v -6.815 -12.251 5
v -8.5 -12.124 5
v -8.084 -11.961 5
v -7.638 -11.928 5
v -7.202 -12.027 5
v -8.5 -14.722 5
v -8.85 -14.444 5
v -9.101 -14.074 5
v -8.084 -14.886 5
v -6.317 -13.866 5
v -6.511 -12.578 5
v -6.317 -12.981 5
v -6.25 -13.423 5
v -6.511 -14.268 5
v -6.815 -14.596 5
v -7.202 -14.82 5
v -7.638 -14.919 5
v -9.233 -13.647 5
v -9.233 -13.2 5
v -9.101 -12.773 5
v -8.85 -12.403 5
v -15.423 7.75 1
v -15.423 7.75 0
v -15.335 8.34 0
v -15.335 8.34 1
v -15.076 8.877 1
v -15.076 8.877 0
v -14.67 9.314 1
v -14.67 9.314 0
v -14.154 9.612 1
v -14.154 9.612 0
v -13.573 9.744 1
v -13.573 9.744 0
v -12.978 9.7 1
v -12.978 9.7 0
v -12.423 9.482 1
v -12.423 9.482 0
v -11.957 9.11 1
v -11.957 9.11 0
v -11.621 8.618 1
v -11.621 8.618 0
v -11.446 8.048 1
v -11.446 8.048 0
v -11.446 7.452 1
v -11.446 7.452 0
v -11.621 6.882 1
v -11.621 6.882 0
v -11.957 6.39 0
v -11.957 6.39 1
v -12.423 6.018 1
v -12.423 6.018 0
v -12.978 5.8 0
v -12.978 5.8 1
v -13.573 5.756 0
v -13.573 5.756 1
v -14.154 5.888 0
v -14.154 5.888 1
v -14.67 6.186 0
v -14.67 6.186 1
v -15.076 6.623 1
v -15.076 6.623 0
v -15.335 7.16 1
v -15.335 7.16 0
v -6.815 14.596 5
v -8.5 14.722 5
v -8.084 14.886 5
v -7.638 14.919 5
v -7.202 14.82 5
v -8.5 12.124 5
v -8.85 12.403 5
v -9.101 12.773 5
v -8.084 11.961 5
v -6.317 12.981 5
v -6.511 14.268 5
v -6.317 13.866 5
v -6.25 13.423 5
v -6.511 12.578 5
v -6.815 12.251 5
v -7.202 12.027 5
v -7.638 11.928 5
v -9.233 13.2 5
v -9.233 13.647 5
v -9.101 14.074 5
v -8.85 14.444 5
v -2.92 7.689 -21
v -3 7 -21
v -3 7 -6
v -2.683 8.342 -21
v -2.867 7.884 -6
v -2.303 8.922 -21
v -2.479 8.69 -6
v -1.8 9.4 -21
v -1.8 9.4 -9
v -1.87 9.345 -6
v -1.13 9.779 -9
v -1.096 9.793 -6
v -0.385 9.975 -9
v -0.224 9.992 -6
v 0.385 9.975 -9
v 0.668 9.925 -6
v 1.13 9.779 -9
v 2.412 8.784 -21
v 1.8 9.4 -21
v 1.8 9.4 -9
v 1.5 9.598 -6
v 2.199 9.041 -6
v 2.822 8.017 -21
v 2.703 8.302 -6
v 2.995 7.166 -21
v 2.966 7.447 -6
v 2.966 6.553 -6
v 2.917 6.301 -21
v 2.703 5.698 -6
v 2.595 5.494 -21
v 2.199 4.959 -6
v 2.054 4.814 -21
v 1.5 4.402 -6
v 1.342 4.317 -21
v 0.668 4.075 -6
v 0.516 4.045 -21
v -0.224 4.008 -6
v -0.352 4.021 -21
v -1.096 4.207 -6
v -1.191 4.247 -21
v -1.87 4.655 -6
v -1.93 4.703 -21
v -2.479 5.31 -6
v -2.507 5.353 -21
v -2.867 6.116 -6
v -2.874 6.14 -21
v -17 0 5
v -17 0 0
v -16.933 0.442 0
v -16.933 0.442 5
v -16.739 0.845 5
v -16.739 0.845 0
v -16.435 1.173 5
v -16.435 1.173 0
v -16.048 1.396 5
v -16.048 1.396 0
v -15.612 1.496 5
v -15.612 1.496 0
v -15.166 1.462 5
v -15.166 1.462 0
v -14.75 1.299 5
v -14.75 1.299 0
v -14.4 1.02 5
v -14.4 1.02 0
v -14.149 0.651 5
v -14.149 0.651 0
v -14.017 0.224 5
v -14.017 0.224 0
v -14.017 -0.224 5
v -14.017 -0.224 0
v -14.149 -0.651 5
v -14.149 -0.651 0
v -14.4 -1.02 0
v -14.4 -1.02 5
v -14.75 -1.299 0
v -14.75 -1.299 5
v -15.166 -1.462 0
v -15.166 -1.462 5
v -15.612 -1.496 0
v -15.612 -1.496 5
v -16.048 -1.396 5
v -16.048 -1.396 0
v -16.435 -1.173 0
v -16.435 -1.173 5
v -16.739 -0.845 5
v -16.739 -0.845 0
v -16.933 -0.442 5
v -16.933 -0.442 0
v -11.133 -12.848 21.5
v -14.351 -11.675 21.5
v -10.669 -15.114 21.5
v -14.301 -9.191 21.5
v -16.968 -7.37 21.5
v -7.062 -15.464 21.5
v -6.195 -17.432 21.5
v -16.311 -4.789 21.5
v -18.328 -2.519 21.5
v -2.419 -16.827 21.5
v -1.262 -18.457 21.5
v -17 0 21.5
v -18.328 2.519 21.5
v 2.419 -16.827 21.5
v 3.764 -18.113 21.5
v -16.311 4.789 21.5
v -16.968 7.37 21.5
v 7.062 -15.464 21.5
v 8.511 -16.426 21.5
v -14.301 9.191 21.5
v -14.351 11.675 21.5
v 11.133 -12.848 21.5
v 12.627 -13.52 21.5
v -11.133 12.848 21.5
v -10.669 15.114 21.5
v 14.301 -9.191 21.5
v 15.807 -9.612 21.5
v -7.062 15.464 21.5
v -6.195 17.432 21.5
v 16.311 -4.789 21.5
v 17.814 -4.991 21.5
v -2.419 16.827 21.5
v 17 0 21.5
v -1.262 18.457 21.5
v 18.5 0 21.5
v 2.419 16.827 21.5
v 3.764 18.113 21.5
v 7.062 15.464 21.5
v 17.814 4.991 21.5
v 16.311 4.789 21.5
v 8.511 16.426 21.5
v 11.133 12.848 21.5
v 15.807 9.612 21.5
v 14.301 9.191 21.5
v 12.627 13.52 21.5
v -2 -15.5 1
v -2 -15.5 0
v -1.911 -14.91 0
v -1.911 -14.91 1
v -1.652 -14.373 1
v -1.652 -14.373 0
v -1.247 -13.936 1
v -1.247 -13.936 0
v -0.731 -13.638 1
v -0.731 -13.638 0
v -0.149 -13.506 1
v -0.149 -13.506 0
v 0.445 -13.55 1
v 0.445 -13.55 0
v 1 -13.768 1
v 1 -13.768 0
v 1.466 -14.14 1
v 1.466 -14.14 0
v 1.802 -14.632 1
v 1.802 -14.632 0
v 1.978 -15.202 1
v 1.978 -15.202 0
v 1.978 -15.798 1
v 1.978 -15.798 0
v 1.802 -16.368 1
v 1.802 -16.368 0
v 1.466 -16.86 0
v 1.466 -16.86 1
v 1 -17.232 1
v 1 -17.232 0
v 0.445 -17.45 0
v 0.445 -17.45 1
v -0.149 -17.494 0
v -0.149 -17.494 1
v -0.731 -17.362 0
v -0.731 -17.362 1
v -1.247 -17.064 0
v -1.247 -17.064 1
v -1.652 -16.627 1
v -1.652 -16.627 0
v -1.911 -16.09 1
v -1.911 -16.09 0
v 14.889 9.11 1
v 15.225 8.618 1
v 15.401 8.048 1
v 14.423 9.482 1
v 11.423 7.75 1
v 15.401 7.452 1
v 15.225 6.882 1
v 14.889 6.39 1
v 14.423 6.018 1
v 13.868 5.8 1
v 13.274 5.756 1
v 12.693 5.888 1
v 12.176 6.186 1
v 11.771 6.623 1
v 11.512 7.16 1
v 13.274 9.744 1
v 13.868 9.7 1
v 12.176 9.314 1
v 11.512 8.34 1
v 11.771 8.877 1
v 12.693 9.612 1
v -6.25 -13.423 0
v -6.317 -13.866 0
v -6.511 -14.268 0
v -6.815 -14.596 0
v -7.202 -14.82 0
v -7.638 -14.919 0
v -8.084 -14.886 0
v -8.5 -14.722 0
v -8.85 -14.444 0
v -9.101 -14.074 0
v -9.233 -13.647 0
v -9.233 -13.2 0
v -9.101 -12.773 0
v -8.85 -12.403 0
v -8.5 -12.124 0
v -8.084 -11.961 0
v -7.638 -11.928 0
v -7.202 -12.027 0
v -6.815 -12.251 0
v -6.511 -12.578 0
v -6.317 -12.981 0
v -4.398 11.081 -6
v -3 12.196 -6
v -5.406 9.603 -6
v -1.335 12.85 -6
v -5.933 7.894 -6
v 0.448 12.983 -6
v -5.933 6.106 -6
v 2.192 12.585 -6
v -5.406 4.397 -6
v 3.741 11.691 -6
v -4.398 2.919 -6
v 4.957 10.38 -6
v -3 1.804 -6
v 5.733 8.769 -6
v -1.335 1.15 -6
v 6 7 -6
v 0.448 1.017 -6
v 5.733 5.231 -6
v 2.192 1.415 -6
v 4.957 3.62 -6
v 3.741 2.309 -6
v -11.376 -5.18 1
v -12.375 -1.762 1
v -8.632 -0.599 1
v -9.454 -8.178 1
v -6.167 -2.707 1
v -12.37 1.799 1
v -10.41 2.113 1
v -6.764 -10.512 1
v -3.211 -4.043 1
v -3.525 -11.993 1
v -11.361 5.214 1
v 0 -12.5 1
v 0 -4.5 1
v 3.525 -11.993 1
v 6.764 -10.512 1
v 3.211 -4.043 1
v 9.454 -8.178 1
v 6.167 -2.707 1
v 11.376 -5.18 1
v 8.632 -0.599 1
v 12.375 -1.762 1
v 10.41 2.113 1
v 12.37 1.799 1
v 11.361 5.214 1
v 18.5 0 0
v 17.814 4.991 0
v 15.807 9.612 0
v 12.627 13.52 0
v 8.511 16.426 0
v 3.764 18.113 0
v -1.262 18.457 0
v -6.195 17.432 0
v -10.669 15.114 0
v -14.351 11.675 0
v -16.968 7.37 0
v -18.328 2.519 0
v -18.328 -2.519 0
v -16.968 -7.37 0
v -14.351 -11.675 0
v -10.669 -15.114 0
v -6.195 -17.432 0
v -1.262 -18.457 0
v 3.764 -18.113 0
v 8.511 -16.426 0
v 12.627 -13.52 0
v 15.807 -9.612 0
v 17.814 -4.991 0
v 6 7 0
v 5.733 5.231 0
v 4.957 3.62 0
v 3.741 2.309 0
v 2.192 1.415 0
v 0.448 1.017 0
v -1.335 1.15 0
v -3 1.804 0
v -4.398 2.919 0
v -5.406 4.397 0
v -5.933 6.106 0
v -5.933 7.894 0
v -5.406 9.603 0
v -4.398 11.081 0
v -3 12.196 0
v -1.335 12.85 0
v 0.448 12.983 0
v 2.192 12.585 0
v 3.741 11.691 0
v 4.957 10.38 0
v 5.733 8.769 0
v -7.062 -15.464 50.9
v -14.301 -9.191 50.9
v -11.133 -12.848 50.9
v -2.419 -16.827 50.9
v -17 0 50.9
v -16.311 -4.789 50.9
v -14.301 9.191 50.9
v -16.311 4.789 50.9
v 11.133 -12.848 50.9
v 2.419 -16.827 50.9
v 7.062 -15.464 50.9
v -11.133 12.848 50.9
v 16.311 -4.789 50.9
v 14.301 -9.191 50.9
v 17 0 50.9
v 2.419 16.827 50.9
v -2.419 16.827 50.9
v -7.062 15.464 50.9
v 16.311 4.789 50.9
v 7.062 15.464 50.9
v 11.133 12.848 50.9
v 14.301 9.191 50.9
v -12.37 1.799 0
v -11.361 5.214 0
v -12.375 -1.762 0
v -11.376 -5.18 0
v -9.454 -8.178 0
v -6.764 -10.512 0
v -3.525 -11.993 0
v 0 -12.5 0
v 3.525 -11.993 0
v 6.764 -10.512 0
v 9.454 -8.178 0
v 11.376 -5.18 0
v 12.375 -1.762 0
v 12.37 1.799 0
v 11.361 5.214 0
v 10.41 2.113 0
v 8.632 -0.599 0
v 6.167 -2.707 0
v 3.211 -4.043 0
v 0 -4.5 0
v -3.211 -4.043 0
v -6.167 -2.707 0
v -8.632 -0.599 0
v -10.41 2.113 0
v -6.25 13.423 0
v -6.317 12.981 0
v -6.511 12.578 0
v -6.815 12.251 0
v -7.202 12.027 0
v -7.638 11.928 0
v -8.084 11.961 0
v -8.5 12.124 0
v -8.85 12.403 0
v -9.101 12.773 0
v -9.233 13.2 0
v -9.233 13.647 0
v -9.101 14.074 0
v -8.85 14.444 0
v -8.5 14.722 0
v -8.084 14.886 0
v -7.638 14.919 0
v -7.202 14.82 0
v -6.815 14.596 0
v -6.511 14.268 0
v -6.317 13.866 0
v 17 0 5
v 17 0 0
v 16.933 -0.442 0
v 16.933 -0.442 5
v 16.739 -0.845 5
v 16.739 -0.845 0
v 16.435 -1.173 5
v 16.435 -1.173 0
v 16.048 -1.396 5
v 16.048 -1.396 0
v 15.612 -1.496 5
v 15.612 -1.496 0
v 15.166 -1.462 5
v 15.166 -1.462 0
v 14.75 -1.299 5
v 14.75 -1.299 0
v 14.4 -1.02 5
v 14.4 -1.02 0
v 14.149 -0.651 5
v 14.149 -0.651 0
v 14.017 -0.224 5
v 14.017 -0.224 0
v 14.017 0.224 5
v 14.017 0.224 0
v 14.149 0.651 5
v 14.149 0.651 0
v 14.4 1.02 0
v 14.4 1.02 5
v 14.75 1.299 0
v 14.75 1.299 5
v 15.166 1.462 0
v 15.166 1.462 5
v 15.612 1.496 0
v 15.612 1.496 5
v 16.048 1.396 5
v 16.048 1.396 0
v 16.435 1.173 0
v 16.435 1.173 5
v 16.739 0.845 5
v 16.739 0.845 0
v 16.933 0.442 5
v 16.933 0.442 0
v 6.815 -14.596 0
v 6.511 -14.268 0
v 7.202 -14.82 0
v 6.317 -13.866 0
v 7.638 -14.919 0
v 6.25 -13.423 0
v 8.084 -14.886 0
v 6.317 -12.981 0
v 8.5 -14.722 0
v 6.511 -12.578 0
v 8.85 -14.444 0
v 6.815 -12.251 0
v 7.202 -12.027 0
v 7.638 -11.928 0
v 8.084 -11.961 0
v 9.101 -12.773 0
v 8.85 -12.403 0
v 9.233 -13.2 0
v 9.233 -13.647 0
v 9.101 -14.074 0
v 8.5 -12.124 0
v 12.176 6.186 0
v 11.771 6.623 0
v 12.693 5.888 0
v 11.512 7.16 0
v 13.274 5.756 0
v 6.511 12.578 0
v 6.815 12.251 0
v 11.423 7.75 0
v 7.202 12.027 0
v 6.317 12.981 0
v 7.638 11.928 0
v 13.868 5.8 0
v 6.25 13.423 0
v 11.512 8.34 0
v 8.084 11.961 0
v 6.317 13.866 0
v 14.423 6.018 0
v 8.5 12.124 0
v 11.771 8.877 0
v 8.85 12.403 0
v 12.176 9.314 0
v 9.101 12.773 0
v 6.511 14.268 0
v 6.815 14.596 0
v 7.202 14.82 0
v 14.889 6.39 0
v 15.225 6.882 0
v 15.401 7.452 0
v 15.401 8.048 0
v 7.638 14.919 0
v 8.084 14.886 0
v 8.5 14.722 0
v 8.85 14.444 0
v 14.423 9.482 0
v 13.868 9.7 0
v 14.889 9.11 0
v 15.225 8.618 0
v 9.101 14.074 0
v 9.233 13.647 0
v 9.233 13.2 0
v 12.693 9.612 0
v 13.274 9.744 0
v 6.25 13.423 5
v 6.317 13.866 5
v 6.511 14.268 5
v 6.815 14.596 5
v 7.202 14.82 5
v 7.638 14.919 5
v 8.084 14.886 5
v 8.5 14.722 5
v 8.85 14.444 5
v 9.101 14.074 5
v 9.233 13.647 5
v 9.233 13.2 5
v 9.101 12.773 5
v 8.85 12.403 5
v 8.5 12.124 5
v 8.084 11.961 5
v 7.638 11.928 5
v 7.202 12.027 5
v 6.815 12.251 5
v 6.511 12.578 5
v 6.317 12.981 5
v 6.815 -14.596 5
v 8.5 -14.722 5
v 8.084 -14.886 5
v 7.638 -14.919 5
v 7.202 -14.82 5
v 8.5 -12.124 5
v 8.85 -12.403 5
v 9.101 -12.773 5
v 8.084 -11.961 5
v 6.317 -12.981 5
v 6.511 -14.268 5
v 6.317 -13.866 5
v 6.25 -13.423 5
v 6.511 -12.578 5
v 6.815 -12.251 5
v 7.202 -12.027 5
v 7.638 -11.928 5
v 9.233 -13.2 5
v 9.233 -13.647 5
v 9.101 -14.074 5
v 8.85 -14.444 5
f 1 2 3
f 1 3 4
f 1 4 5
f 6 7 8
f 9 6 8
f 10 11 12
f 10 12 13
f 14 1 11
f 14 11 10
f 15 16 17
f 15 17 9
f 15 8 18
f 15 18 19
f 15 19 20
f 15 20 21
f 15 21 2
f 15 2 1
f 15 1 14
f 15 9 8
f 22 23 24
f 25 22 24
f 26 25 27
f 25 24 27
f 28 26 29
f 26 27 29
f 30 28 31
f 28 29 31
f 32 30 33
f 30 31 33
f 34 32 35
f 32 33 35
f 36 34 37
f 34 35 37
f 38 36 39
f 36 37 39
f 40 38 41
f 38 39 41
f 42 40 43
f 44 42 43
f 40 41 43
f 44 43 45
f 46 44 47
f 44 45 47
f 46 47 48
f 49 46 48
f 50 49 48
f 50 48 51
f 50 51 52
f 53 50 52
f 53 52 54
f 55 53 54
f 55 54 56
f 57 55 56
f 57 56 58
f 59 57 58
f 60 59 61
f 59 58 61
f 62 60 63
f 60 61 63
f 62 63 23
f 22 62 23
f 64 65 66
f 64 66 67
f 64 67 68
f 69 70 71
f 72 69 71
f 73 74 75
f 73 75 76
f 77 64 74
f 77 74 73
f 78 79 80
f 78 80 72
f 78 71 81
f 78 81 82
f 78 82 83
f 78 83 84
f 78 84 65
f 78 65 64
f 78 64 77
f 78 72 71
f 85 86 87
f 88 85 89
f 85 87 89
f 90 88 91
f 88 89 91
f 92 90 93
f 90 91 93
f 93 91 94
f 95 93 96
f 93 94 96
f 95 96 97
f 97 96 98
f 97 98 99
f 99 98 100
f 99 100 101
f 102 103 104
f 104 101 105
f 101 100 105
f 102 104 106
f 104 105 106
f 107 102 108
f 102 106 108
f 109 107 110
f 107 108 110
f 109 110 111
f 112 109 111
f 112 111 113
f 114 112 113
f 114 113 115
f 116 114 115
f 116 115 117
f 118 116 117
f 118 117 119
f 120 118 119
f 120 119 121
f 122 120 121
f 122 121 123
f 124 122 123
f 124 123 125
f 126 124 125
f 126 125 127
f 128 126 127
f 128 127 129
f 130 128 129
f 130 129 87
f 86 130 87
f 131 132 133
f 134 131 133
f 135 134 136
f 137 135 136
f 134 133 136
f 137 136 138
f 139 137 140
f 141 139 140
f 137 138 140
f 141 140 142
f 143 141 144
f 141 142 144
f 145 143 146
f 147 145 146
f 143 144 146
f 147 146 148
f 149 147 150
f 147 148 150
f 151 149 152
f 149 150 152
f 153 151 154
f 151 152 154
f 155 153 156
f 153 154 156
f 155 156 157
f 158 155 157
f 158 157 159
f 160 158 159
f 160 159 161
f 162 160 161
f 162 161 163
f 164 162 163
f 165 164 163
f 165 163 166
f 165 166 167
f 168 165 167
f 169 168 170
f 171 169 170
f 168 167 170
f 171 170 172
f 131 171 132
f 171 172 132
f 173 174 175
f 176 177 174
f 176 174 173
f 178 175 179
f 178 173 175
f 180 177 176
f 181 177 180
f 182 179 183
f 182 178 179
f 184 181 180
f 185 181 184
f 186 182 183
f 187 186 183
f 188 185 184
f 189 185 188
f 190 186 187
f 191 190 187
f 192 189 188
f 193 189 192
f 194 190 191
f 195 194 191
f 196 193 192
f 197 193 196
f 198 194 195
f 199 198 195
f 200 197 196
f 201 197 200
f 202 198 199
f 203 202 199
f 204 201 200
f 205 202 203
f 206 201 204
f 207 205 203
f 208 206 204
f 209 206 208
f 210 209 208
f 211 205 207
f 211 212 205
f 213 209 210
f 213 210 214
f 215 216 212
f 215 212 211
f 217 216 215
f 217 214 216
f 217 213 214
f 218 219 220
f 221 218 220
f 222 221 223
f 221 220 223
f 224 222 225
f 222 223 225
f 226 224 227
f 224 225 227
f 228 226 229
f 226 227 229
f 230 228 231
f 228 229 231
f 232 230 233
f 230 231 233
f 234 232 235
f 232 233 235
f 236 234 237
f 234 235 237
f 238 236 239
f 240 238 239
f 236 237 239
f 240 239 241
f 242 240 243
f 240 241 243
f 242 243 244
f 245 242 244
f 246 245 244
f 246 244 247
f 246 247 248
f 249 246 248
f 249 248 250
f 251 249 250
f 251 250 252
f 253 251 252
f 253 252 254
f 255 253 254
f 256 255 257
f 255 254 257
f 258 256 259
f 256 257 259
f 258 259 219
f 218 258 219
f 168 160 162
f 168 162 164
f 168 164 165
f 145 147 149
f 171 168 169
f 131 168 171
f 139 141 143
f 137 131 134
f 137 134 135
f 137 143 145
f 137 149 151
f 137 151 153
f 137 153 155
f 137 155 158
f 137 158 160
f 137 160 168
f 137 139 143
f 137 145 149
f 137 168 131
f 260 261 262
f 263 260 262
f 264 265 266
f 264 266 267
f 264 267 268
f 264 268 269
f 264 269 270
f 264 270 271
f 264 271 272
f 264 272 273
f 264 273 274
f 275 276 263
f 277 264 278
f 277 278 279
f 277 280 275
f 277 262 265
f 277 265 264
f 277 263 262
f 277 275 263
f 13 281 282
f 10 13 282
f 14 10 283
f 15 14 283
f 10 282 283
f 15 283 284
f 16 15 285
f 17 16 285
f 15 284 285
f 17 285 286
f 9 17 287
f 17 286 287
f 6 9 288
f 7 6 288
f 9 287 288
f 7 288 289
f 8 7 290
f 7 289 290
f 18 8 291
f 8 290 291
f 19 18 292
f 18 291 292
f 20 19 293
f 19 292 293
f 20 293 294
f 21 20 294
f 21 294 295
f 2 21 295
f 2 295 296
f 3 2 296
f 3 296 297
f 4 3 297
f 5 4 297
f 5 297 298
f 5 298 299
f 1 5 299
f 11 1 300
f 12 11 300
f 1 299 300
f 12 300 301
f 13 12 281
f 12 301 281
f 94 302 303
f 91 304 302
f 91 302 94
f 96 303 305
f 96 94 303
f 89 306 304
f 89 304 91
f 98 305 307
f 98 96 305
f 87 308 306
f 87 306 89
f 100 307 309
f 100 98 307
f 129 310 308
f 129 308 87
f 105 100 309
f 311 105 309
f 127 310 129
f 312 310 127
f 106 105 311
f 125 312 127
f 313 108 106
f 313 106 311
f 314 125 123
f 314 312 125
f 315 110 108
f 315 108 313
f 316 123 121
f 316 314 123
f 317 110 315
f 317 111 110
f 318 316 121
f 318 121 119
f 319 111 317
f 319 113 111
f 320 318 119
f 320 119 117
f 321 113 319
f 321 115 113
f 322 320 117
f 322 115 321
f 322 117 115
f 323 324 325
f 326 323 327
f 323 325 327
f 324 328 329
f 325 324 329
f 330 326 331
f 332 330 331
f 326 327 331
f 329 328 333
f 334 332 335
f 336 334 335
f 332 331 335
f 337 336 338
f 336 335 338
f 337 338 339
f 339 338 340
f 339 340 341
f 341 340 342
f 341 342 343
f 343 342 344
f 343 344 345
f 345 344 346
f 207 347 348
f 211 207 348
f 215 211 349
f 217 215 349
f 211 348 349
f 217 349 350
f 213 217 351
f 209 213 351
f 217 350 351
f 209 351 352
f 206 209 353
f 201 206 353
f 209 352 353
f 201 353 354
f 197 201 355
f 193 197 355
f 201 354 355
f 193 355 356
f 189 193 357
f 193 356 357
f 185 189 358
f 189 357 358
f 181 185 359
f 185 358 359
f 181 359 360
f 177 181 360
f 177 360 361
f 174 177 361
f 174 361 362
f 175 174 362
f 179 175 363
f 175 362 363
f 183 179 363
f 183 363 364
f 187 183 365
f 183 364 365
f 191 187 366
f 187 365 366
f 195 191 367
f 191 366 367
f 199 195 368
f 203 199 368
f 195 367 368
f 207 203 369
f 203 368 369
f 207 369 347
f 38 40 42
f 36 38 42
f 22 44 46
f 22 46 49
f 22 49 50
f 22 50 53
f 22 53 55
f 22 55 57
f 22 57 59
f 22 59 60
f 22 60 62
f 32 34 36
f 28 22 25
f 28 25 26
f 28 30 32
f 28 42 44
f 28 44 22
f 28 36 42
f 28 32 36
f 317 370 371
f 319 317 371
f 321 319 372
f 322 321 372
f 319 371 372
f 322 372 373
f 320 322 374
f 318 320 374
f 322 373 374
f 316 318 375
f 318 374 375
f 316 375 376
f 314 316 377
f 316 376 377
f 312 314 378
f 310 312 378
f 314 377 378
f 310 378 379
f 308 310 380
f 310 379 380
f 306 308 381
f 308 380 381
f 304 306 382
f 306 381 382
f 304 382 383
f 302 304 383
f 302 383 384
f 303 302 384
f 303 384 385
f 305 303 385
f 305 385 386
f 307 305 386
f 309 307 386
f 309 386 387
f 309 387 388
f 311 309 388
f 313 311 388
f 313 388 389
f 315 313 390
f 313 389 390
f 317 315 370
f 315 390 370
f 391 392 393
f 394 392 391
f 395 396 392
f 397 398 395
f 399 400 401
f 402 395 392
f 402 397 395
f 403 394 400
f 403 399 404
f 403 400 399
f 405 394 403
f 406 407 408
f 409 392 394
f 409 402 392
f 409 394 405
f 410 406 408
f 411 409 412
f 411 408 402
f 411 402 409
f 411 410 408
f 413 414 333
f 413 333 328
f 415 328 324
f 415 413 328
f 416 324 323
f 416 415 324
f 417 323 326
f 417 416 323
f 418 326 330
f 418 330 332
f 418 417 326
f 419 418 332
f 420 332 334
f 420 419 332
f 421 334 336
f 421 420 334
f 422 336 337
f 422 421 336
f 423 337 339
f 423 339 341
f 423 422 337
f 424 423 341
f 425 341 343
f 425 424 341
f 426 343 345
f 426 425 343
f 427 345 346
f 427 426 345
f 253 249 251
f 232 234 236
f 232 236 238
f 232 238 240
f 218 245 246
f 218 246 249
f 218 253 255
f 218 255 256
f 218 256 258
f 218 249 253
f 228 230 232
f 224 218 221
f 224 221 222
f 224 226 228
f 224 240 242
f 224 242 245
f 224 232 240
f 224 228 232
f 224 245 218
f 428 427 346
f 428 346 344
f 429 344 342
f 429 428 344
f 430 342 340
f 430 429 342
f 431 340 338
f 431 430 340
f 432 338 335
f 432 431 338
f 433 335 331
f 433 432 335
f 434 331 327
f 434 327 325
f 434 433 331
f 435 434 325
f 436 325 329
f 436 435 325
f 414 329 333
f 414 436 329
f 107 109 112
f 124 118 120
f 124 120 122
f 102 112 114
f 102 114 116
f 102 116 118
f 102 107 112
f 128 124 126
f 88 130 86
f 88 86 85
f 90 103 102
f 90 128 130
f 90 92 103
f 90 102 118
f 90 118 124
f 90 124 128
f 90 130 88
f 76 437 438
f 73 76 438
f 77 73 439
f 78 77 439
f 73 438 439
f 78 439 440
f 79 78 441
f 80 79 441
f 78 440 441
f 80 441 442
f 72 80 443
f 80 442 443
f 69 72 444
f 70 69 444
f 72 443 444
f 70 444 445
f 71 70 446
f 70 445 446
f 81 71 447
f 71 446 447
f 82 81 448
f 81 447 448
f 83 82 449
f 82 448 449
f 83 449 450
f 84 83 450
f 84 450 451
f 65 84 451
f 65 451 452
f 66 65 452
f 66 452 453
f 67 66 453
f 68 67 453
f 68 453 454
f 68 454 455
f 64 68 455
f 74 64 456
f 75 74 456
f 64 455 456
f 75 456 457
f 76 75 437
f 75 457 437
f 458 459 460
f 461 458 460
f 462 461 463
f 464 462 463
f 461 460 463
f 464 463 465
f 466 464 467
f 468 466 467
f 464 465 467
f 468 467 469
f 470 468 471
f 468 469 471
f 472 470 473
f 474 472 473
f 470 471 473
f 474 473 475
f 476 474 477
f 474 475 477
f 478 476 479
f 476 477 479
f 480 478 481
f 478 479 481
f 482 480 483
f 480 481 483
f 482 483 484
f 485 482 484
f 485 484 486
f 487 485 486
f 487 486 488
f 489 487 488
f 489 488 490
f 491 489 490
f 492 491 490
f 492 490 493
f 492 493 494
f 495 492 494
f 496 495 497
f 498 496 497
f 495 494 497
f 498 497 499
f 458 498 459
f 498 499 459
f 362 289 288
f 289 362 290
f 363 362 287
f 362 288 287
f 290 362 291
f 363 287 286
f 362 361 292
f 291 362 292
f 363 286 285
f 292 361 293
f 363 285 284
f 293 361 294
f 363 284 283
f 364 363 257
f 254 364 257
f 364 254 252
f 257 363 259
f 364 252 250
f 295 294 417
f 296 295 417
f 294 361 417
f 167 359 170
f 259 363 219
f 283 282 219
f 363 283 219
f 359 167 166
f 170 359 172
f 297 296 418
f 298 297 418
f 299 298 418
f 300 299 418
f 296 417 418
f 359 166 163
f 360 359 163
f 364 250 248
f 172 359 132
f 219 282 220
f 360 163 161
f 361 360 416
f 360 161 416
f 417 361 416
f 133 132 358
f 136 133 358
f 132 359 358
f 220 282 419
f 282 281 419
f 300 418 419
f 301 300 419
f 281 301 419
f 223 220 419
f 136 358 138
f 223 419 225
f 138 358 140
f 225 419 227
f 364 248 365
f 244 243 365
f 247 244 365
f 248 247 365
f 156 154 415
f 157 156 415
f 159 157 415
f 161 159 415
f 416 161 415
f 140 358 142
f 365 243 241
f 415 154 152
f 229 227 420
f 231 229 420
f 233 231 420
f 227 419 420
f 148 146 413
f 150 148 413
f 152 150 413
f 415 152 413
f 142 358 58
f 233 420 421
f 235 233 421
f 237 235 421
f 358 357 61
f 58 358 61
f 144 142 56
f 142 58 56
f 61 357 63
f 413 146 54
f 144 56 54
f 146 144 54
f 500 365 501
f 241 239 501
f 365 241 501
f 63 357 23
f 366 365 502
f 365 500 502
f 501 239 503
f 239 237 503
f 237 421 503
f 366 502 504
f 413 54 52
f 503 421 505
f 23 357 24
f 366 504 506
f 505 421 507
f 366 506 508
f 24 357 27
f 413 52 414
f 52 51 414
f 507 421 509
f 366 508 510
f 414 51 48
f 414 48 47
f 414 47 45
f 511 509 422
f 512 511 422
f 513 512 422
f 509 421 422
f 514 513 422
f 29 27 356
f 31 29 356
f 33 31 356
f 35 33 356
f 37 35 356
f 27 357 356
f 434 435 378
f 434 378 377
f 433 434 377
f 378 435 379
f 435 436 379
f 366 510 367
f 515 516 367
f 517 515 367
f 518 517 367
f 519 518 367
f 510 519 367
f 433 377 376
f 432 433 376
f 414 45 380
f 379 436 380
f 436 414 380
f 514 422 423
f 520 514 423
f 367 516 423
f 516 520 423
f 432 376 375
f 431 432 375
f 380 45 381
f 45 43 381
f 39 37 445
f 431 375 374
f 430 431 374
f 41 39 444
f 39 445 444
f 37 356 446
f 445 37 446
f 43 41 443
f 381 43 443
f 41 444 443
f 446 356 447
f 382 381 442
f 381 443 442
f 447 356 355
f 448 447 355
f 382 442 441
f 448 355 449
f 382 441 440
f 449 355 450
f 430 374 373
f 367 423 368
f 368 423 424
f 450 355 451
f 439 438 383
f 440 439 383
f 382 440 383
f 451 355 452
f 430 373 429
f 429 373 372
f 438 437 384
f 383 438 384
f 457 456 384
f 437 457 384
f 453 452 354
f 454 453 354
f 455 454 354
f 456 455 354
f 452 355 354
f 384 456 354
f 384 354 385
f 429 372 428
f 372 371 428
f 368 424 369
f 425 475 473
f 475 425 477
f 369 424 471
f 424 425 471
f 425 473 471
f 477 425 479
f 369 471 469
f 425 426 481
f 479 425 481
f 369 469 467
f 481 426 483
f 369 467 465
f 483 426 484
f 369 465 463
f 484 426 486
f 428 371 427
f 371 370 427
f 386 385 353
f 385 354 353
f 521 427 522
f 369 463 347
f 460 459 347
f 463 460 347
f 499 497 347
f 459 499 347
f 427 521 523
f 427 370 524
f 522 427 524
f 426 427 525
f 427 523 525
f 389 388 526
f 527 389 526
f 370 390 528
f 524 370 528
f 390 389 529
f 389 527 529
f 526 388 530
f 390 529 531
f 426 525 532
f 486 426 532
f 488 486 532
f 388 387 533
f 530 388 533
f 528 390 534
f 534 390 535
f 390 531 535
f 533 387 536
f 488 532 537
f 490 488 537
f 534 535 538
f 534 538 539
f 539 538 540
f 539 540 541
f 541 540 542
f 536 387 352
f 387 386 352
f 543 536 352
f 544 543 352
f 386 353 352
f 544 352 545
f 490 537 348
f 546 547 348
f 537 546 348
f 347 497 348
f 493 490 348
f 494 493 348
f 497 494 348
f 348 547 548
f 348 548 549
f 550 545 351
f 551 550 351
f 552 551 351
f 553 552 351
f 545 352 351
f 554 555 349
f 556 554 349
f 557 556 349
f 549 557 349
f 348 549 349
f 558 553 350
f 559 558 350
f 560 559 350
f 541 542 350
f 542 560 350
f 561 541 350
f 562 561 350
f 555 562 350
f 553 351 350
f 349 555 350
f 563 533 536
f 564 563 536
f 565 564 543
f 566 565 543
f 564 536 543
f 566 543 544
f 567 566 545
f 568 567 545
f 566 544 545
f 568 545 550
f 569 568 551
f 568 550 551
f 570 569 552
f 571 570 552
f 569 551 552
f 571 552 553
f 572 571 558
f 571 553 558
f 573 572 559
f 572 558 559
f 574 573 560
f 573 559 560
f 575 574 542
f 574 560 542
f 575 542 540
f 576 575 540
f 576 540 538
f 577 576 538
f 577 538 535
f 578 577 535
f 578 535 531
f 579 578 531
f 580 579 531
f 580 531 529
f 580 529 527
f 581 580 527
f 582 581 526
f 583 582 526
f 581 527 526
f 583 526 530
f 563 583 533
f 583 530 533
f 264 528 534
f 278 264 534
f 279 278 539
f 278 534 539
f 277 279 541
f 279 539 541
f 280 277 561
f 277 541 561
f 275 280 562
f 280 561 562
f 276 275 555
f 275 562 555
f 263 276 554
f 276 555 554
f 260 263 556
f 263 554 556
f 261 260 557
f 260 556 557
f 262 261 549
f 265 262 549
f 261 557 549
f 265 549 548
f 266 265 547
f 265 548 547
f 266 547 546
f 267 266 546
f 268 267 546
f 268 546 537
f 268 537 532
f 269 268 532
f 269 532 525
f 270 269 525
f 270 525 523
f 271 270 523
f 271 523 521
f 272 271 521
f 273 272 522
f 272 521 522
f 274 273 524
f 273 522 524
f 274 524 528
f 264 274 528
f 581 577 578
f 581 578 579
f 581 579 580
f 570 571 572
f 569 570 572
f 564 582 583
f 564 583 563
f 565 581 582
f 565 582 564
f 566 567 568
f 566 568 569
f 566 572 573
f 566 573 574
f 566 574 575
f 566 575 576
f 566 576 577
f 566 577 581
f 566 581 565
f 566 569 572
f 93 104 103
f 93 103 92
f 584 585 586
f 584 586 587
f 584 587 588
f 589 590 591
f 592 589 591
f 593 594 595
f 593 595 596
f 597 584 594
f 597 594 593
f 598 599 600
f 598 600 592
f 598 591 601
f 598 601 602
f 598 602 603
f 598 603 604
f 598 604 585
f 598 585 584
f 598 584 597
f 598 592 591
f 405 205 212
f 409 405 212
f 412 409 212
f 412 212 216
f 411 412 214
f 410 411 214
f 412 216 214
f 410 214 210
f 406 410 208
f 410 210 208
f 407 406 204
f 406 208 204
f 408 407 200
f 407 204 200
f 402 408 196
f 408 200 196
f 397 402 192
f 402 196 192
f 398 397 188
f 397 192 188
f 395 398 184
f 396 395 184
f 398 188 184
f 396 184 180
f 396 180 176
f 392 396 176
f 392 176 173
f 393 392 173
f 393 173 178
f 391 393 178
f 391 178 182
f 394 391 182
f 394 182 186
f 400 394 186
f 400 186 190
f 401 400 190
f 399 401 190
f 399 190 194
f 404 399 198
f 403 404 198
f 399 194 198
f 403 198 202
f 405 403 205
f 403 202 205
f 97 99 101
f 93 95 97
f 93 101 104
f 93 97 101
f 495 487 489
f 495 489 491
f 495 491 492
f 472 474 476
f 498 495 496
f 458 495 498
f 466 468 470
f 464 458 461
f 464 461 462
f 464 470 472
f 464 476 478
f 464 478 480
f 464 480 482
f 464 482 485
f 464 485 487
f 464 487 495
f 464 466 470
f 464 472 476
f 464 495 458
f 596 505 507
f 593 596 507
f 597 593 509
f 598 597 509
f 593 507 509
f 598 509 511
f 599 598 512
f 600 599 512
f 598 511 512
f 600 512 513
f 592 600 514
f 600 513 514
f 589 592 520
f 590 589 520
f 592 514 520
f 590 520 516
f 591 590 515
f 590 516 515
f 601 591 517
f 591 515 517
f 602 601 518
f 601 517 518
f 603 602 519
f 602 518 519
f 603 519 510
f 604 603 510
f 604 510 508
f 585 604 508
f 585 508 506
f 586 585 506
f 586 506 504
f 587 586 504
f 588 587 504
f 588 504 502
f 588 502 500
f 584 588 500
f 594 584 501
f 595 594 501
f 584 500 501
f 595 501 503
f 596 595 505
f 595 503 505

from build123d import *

# Parameters (mm, degrees)
SKETCH_1_R          = 18.5
EXTRUDE_1_DEPTH     = 21.5
SKETCH_2_R          = 17
EXTRUDE_2_DEPTH     = 29.4
CUT_EXTRUDE_1_DEPTH = 1
SKETCH_4_R          = 6
EXTRUDE_3_DEPTH     = 6
SKETCH_5_R          = 3
EXTRUDE_4_DEPTH     = 15
CUT_EXTRUDE_START   = -12
CUT_EXTRUDE_2_DEPTH = 12
SKETCH_7_R          = 1.5
CUT_EXTRUDE_3_DEPTH = 5
SKETCH_8_R          = 2
CUT_EXTRUDE_4_DEPTH = 1


with BuildPart() as part:
    # 草图1 → 凸台-拉伸1 (new body)
    with BuildSketch(Plane.XY):
        Circle(SKETCH_1_R)
    extrude(amount=EXTRUDE_1_DEPTH)

    # 草图2 → 凸台-拉伸2 (add)
    with BuildSketch(Plane.XY.offset(21.5)):
        Circle(SKETCH_2_R)
    extrude(amount=EXTRUDE_2_DEPTH)

    # 草图3 → 切除-拉伸1 (cut)
    with BuildSketch(Plane(origin=(0, 0, 0), x_dir=(-1, 0, 0), z_dir=(0, 0, -1))):
        with BuildLine():
            ThreePointArc((-11.36051163, 5.214285714), (0, -4.5), (11.36051163, 5.214285714))
            ThreePointArc((11.36051163, 5.214285714), (0, -12.5), (-11.36051163, 5.214285714))
        make_face()
    extrude(amount=-CUT_EXTRUDE_1_DEPTH, mode=Mode.SUBTRACT)

    # 草图4 → 凸台-拉伸3 (add)
    with BuildSketch(Plane(origin=(0, 0, 0), x_dir=(-1, 0, 0), z_dir=(0, 0, -1))):
        with Locations(Location((0, 7, 0), (0, 0, 180))):
            Circle(SKETCH_4_R)
    extrude(amount=EXTRUDE_3_DEPTH)

    # 草图5 → 凸台-拉伸4 (add)
    with BuildSketch(Plane(origin=(0, 0, -6), x_dir=(-1, 0, 0), z_dir=(0, 0, -1))):
        with Locations((0, 7)):
            Circle(SKETCH_5_R)
    extrude(amount=EXTRUDE_4_DEPTH)

    # 草图6 → 切除-拉伸2 (cut)
    with BuildSketch(Plane(origin=(0, 0, -21), x_dir=(-1, 0, 0), z_dir=(0, 0, -1)).offset(CUT_EXTRUDE_START)):
        with BuildLine():
            Line((0, 9.4), (1.8, 9.4))
            ThreePointArc((1.8, 9.4), (0, 10), (-1.8, 9.4))
            Line((-1.8, 9.4), (0, 9.4))
        make_face()
    extrude(amount=CUT_EXTRUDE_2_DEPTH, mode=Mode.SUBTRACT)

    # 草图7 → 切除-拉伸3 (cut)
    with BuildSketch(Plane(origin=(0, 0, 0), x_dir=(-1, 0, 0), z_dir=(0, 0, -1))):
        with Locations((15.5, 0)):
            Circle(SKETCH_7_R)
        with Locations(Location((-15.5, 0, 0), (0, 0, 180))):
            Circle(SKETCH_7_R)
        with Locations((-7.75, -13.423393759)):
            Circle(SKETCH_7_R)
        with Locations(Location((7.75, 13.423393759, 0), (0, 0, 180))):
            Circle(SKETCH_7_R)
        with Locations((-7.75, 13.423393759)):
            Circle(SKETCH_7_R)
        with Locations(Location((7.75, -13.423393759, 0), (0, 0, 180))):
            Circle(SKETCH_7_R)
    extrude(amount=-CUT_EXTRUDE_3_DEPTH, mode=Mode.SUBTRACT)

    # 草图8 → 切除-拉伸4 (cut)
    with BuildSketch(Plane(origin=(0, 0, 0), x_dir=(-1, 0, 0), z_dir=(0, 0, -1))):
        with Locations((0, -15.5)):
            Circle(SKETCH_8_R)
        with Locations((-13.423393759, 7.75)):
            Circle(SKETCH_8_R)
        with Locations((13.423393759, 7.75)):
            Circle(SKETCH_8_R)
    extrude(amount=-CUT_EXTRUDE_4_DEPTH, mode=Mode.SUBTRACT)


solid = part.part
